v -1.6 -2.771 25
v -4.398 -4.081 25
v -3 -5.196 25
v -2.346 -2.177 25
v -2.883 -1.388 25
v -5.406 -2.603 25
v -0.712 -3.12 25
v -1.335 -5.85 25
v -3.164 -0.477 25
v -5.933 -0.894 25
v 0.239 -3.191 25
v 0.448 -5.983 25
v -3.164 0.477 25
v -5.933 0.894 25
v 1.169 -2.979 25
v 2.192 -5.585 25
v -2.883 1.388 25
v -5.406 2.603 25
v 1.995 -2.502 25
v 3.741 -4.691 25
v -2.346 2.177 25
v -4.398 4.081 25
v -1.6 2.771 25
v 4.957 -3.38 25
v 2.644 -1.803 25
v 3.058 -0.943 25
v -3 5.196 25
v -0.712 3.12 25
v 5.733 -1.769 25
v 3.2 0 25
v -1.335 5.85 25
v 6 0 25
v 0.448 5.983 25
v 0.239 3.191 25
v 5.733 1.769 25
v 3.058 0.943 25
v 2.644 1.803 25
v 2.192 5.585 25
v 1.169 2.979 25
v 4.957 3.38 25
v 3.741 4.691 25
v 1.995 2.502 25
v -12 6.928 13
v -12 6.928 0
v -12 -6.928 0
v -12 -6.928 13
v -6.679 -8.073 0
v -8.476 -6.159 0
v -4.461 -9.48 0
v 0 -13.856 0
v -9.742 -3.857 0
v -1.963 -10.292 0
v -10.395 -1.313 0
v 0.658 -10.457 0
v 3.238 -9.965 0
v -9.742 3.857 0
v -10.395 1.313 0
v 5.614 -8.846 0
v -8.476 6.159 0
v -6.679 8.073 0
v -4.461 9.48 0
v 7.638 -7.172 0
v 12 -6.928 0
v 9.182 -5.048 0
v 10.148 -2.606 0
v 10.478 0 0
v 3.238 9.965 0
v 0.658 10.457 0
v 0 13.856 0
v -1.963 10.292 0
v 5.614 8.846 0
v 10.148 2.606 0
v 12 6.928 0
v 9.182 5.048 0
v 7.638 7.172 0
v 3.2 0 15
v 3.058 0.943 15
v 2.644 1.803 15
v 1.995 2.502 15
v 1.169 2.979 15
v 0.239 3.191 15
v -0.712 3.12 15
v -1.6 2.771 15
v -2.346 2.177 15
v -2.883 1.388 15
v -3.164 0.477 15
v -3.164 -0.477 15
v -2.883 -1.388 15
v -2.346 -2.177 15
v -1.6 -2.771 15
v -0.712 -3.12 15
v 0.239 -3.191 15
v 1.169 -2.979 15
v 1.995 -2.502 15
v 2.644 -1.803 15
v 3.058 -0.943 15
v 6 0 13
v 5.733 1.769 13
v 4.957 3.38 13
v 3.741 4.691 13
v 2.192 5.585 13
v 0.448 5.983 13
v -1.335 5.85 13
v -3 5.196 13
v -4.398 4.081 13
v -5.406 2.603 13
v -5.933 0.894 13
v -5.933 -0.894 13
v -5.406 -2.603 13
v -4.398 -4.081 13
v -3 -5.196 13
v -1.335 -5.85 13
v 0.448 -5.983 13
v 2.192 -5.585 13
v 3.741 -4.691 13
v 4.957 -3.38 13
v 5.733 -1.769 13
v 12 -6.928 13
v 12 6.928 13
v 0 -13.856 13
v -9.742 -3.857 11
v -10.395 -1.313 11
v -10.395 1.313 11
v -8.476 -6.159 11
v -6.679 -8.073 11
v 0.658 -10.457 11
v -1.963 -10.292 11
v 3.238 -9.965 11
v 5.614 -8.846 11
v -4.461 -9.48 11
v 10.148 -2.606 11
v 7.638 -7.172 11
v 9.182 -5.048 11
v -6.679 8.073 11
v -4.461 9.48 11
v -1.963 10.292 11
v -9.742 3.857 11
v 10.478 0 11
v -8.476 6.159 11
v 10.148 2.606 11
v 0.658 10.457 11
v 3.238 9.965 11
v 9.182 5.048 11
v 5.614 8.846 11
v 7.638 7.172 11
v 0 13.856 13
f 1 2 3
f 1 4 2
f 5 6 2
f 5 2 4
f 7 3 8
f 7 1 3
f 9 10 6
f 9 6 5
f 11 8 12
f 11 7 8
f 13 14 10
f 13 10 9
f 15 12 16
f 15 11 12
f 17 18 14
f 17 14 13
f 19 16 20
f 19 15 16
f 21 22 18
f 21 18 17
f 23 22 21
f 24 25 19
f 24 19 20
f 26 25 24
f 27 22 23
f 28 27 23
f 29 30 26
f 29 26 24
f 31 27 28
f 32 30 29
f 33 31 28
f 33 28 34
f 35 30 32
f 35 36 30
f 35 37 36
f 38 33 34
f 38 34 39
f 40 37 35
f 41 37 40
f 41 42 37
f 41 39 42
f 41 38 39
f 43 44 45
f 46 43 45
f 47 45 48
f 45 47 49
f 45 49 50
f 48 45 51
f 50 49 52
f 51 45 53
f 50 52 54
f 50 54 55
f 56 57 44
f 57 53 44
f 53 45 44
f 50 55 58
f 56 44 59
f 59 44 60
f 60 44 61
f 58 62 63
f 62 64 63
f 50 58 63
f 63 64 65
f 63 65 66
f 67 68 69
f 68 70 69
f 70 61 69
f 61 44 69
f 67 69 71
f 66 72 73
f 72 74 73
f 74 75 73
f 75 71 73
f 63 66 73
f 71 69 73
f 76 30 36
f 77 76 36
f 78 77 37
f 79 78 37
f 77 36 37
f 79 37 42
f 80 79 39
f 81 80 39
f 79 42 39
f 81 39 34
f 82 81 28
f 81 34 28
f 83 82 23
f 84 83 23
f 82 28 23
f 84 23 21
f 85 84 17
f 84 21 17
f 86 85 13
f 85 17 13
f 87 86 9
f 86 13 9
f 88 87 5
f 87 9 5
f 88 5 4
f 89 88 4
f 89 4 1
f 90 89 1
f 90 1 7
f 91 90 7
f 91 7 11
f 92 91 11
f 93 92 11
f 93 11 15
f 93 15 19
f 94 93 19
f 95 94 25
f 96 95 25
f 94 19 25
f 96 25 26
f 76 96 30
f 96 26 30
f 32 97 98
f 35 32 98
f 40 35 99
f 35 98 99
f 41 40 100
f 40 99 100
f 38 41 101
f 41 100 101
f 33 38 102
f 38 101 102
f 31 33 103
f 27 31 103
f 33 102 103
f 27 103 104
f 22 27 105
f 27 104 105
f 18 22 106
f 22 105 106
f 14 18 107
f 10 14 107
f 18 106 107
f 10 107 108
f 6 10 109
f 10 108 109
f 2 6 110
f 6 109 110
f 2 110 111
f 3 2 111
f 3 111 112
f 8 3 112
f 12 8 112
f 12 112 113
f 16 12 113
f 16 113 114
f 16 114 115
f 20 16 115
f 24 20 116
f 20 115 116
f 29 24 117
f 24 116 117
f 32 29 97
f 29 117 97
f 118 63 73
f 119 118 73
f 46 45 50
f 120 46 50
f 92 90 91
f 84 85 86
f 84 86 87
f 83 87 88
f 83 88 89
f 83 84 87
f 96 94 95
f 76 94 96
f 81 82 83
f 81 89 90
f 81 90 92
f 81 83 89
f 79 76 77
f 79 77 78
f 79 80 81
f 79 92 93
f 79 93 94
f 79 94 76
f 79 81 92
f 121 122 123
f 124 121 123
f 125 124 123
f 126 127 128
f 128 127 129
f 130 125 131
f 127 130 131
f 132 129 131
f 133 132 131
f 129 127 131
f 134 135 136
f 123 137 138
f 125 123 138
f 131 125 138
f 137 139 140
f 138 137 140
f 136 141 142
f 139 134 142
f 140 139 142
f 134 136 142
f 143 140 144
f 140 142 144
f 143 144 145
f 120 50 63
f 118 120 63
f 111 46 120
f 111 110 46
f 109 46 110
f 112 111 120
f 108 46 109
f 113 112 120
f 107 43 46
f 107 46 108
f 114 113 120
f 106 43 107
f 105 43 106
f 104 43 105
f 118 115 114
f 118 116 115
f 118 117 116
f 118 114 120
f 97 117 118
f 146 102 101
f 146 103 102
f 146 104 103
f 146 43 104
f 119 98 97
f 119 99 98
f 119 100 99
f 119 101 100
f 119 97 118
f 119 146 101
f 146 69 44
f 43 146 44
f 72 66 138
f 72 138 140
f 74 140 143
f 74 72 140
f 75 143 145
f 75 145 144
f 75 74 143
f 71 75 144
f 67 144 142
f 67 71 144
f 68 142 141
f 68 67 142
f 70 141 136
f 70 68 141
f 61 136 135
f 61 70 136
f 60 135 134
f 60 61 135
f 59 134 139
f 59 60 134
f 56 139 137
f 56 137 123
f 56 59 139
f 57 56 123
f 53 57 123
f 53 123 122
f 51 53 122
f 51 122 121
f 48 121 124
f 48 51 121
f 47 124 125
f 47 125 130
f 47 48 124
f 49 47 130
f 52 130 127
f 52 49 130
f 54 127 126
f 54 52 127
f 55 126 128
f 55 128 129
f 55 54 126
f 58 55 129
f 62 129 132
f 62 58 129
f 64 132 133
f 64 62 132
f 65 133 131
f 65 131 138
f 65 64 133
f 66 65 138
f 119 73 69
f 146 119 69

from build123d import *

# Parameters (mm, degrees)
HEX_NUT_DEPTH         = 13
SKETCH2_R             = 10.4775
THREAD_BORE_DEPTH     = 11
PUSH_FIT_PORT_START   = 13
SKETCH3_R             = 6
PUSH_FIT_PORT_DEPTH   = 12
PUSH_FIT_SOCKET_START = 25
SKETCH4_R             = 3.2
PUSH_FIT_SOCKET_DEPTH = 10


with BuildPart() as part:
    # Sketch1 → Hex_Nut (new body)
    with BuildSketch(Plane.XY):
        Polygon((12, 6.92820323), (0, 13.856406461), (-12, 6.92820323), (-12, -6.92820323), (0, -13.856406461), (12, -6.92820323), align=None)
    extrude(amount=HEX_NUT_DEPTH)

    # Sketch2 → Thread_Bore (cut)
    with BuildSketch(Plane.XY):
        Circle(SKETCH2_R)
    extrude(amount=THREAD_BORE_DEPTH, mode=Mode.SUBTRACT)

    # Sketch3 → Push_Fit_Port (add)
    with BuildSketch(Plane.XY.offset(PUSH_FIT_PORT_START)):
        Circle(SKETCH3_R)
    extrude(amount=PUSH_FIT_PORT_DEPTH)

    # Sketch4 → Push_Fit_Socket (cut)
    with BuildSketch(Plane.XY.offset(PUSH_FIT_SOCKET_START)):
        Circle(SKETCH4_R)
    extrude(amount=-PUSH_FIT_SOCKET_DEPTH, mode=Mode.SUBTRACT)


solid = part.part
